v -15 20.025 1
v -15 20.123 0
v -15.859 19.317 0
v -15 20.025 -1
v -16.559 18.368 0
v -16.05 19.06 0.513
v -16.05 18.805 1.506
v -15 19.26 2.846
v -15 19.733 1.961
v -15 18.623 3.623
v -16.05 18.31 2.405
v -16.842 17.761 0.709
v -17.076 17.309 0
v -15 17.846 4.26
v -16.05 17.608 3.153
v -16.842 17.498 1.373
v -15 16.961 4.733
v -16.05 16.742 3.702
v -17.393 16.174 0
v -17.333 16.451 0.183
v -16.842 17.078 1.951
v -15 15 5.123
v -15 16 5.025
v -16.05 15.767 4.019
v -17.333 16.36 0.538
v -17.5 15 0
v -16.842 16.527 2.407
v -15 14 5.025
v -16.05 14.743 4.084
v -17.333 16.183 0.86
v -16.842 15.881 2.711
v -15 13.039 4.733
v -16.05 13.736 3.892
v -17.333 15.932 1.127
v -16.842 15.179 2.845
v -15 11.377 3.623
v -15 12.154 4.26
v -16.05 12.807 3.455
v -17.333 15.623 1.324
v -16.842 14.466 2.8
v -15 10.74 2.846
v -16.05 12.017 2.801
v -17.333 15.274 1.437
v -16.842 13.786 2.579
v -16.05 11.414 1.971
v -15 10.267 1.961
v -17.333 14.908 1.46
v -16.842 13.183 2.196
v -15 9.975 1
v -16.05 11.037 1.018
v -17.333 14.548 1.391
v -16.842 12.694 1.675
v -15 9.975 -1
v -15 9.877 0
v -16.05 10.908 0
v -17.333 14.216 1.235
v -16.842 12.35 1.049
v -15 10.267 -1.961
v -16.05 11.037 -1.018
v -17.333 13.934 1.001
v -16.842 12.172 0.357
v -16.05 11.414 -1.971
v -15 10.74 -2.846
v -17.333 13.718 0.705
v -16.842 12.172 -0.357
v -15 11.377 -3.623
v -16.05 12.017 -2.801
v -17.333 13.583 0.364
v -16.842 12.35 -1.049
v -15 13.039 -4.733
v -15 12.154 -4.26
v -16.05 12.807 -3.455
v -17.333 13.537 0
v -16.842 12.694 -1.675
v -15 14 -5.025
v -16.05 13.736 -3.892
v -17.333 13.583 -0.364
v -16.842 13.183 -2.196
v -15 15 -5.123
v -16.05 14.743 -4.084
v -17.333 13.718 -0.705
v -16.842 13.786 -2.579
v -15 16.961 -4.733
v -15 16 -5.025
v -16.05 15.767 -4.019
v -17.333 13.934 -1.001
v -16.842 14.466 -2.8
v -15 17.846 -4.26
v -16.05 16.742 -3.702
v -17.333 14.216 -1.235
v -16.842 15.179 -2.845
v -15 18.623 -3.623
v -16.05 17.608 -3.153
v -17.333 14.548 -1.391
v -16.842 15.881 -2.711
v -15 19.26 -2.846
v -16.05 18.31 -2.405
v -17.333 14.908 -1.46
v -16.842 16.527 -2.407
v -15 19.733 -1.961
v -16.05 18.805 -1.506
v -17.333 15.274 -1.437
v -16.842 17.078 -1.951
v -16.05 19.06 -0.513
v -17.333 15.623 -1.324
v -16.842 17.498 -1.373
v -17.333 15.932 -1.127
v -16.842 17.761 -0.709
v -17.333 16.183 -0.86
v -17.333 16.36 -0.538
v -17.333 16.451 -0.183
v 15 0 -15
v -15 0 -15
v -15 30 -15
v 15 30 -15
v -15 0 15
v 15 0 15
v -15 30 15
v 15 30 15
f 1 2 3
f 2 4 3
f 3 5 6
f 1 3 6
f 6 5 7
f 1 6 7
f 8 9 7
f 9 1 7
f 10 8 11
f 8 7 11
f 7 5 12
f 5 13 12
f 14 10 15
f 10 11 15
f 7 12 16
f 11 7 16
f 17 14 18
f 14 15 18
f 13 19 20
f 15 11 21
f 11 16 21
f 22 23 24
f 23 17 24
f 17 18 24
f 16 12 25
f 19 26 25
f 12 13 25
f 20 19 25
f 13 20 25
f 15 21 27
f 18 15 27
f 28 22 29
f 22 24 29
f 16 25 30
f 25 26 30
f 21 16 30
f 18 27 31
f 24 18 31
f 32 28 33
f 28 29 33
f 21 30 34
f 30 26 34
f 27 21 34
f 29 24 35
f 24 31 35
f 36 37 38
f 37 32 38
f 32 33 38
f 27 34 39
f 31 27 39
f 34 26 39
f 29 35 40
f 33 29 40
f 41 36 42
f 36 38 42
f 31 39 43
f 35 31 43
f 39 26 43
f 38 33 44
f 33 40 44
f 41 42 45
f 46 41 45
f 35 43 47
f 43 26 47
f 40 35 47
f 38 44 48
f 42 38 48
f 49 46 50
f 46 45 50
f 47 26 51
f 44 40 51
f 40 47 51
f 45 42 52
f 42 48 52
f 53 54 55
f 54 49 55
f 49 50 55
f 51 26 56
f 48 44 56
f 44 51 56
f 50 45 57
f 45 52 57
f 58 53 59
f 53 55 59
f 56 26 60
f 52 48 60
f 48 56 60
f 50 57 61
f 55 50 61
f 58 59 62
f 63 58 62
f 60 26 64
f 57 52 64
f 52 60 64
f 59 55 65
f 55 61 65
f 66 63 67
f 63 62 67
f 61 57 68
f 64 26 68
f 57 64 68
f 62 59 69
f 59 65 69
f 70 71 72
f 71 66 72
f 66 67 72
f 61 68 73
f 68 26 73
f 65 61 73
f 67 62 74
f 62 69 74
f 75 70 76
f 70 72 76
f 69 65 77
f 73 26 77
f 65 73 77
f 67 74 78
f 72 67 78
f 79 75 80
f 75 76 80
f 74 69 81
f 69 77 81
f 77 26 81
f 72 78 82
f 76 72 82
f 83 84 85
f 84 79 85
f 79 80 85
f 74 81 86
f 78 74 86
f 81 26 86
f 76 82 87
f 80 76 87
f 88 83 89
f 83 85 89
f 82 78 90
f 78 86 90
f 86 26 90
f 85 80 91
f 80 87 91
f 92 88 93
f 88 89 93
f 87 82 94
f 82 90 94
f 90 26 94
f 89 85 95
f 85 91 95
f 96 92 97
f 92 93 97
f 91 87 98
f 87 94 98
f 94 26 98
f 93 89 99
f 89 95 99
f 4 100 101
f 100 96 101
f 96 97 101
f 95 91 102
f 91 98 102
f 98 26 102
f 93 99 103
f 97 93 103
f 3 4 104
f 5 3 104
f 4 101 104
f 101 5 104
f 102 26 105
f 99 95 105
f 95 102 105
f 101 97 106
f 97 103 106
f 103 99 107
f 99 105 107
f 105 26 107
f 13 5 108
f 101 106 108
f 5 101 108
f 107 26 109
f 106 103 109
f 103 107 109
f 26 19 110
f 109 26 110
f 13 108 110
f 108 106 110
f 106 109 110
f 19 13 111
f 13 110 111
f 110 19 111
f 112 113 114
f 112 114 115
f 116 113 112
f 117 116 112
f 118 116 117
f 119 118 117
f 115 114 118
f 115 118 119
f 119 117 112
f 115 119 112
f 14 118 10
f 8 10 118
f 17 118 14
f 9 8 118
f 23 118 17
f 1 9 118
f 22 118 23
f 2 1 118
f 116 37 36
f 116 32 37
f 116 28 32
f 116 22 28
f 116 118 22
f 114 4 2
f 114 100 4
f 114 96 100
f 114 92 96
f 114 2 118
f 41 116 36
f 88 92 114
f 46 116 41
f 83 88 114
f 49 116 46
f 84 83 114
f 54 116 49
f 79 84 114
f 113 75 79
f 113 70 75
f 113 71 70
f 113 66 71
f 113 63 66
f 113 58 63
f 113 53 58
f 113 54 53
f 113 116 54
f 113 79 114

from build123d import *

# Parameters (mm, degrees)
SKETCH_1_W      = 30
SKETCH_1_H      = 30
EXTRUDE_1_DEPTH = 30


with BuildPart() as part:
    # 스케치1 → 보스-돌출1 (new body)
    with BuildSketch(Plane(origin=(0, 0, 0), x_dir=(1, 0, 0), z_dir=(0, 1, 0))):
        Rectangle(SKETCH_1_W, SKETCH_1_H)
    extrude(amount=EXTRUDE_1_DEPTH)

    # 스케치2 → 회전1 (revolve)
    with BuildSketch(Plane.XY):
        with BuildLine():
            Line((-17.5, 15), (-4.5, 15))
            ThreePointArc((-4.5, 15), (-11, 21.5), (-17.5, 15))
        make_face()
    revolve(axis=Axis((-17.5, 15, 0), (1, 0, 0)))


solid = part.part
